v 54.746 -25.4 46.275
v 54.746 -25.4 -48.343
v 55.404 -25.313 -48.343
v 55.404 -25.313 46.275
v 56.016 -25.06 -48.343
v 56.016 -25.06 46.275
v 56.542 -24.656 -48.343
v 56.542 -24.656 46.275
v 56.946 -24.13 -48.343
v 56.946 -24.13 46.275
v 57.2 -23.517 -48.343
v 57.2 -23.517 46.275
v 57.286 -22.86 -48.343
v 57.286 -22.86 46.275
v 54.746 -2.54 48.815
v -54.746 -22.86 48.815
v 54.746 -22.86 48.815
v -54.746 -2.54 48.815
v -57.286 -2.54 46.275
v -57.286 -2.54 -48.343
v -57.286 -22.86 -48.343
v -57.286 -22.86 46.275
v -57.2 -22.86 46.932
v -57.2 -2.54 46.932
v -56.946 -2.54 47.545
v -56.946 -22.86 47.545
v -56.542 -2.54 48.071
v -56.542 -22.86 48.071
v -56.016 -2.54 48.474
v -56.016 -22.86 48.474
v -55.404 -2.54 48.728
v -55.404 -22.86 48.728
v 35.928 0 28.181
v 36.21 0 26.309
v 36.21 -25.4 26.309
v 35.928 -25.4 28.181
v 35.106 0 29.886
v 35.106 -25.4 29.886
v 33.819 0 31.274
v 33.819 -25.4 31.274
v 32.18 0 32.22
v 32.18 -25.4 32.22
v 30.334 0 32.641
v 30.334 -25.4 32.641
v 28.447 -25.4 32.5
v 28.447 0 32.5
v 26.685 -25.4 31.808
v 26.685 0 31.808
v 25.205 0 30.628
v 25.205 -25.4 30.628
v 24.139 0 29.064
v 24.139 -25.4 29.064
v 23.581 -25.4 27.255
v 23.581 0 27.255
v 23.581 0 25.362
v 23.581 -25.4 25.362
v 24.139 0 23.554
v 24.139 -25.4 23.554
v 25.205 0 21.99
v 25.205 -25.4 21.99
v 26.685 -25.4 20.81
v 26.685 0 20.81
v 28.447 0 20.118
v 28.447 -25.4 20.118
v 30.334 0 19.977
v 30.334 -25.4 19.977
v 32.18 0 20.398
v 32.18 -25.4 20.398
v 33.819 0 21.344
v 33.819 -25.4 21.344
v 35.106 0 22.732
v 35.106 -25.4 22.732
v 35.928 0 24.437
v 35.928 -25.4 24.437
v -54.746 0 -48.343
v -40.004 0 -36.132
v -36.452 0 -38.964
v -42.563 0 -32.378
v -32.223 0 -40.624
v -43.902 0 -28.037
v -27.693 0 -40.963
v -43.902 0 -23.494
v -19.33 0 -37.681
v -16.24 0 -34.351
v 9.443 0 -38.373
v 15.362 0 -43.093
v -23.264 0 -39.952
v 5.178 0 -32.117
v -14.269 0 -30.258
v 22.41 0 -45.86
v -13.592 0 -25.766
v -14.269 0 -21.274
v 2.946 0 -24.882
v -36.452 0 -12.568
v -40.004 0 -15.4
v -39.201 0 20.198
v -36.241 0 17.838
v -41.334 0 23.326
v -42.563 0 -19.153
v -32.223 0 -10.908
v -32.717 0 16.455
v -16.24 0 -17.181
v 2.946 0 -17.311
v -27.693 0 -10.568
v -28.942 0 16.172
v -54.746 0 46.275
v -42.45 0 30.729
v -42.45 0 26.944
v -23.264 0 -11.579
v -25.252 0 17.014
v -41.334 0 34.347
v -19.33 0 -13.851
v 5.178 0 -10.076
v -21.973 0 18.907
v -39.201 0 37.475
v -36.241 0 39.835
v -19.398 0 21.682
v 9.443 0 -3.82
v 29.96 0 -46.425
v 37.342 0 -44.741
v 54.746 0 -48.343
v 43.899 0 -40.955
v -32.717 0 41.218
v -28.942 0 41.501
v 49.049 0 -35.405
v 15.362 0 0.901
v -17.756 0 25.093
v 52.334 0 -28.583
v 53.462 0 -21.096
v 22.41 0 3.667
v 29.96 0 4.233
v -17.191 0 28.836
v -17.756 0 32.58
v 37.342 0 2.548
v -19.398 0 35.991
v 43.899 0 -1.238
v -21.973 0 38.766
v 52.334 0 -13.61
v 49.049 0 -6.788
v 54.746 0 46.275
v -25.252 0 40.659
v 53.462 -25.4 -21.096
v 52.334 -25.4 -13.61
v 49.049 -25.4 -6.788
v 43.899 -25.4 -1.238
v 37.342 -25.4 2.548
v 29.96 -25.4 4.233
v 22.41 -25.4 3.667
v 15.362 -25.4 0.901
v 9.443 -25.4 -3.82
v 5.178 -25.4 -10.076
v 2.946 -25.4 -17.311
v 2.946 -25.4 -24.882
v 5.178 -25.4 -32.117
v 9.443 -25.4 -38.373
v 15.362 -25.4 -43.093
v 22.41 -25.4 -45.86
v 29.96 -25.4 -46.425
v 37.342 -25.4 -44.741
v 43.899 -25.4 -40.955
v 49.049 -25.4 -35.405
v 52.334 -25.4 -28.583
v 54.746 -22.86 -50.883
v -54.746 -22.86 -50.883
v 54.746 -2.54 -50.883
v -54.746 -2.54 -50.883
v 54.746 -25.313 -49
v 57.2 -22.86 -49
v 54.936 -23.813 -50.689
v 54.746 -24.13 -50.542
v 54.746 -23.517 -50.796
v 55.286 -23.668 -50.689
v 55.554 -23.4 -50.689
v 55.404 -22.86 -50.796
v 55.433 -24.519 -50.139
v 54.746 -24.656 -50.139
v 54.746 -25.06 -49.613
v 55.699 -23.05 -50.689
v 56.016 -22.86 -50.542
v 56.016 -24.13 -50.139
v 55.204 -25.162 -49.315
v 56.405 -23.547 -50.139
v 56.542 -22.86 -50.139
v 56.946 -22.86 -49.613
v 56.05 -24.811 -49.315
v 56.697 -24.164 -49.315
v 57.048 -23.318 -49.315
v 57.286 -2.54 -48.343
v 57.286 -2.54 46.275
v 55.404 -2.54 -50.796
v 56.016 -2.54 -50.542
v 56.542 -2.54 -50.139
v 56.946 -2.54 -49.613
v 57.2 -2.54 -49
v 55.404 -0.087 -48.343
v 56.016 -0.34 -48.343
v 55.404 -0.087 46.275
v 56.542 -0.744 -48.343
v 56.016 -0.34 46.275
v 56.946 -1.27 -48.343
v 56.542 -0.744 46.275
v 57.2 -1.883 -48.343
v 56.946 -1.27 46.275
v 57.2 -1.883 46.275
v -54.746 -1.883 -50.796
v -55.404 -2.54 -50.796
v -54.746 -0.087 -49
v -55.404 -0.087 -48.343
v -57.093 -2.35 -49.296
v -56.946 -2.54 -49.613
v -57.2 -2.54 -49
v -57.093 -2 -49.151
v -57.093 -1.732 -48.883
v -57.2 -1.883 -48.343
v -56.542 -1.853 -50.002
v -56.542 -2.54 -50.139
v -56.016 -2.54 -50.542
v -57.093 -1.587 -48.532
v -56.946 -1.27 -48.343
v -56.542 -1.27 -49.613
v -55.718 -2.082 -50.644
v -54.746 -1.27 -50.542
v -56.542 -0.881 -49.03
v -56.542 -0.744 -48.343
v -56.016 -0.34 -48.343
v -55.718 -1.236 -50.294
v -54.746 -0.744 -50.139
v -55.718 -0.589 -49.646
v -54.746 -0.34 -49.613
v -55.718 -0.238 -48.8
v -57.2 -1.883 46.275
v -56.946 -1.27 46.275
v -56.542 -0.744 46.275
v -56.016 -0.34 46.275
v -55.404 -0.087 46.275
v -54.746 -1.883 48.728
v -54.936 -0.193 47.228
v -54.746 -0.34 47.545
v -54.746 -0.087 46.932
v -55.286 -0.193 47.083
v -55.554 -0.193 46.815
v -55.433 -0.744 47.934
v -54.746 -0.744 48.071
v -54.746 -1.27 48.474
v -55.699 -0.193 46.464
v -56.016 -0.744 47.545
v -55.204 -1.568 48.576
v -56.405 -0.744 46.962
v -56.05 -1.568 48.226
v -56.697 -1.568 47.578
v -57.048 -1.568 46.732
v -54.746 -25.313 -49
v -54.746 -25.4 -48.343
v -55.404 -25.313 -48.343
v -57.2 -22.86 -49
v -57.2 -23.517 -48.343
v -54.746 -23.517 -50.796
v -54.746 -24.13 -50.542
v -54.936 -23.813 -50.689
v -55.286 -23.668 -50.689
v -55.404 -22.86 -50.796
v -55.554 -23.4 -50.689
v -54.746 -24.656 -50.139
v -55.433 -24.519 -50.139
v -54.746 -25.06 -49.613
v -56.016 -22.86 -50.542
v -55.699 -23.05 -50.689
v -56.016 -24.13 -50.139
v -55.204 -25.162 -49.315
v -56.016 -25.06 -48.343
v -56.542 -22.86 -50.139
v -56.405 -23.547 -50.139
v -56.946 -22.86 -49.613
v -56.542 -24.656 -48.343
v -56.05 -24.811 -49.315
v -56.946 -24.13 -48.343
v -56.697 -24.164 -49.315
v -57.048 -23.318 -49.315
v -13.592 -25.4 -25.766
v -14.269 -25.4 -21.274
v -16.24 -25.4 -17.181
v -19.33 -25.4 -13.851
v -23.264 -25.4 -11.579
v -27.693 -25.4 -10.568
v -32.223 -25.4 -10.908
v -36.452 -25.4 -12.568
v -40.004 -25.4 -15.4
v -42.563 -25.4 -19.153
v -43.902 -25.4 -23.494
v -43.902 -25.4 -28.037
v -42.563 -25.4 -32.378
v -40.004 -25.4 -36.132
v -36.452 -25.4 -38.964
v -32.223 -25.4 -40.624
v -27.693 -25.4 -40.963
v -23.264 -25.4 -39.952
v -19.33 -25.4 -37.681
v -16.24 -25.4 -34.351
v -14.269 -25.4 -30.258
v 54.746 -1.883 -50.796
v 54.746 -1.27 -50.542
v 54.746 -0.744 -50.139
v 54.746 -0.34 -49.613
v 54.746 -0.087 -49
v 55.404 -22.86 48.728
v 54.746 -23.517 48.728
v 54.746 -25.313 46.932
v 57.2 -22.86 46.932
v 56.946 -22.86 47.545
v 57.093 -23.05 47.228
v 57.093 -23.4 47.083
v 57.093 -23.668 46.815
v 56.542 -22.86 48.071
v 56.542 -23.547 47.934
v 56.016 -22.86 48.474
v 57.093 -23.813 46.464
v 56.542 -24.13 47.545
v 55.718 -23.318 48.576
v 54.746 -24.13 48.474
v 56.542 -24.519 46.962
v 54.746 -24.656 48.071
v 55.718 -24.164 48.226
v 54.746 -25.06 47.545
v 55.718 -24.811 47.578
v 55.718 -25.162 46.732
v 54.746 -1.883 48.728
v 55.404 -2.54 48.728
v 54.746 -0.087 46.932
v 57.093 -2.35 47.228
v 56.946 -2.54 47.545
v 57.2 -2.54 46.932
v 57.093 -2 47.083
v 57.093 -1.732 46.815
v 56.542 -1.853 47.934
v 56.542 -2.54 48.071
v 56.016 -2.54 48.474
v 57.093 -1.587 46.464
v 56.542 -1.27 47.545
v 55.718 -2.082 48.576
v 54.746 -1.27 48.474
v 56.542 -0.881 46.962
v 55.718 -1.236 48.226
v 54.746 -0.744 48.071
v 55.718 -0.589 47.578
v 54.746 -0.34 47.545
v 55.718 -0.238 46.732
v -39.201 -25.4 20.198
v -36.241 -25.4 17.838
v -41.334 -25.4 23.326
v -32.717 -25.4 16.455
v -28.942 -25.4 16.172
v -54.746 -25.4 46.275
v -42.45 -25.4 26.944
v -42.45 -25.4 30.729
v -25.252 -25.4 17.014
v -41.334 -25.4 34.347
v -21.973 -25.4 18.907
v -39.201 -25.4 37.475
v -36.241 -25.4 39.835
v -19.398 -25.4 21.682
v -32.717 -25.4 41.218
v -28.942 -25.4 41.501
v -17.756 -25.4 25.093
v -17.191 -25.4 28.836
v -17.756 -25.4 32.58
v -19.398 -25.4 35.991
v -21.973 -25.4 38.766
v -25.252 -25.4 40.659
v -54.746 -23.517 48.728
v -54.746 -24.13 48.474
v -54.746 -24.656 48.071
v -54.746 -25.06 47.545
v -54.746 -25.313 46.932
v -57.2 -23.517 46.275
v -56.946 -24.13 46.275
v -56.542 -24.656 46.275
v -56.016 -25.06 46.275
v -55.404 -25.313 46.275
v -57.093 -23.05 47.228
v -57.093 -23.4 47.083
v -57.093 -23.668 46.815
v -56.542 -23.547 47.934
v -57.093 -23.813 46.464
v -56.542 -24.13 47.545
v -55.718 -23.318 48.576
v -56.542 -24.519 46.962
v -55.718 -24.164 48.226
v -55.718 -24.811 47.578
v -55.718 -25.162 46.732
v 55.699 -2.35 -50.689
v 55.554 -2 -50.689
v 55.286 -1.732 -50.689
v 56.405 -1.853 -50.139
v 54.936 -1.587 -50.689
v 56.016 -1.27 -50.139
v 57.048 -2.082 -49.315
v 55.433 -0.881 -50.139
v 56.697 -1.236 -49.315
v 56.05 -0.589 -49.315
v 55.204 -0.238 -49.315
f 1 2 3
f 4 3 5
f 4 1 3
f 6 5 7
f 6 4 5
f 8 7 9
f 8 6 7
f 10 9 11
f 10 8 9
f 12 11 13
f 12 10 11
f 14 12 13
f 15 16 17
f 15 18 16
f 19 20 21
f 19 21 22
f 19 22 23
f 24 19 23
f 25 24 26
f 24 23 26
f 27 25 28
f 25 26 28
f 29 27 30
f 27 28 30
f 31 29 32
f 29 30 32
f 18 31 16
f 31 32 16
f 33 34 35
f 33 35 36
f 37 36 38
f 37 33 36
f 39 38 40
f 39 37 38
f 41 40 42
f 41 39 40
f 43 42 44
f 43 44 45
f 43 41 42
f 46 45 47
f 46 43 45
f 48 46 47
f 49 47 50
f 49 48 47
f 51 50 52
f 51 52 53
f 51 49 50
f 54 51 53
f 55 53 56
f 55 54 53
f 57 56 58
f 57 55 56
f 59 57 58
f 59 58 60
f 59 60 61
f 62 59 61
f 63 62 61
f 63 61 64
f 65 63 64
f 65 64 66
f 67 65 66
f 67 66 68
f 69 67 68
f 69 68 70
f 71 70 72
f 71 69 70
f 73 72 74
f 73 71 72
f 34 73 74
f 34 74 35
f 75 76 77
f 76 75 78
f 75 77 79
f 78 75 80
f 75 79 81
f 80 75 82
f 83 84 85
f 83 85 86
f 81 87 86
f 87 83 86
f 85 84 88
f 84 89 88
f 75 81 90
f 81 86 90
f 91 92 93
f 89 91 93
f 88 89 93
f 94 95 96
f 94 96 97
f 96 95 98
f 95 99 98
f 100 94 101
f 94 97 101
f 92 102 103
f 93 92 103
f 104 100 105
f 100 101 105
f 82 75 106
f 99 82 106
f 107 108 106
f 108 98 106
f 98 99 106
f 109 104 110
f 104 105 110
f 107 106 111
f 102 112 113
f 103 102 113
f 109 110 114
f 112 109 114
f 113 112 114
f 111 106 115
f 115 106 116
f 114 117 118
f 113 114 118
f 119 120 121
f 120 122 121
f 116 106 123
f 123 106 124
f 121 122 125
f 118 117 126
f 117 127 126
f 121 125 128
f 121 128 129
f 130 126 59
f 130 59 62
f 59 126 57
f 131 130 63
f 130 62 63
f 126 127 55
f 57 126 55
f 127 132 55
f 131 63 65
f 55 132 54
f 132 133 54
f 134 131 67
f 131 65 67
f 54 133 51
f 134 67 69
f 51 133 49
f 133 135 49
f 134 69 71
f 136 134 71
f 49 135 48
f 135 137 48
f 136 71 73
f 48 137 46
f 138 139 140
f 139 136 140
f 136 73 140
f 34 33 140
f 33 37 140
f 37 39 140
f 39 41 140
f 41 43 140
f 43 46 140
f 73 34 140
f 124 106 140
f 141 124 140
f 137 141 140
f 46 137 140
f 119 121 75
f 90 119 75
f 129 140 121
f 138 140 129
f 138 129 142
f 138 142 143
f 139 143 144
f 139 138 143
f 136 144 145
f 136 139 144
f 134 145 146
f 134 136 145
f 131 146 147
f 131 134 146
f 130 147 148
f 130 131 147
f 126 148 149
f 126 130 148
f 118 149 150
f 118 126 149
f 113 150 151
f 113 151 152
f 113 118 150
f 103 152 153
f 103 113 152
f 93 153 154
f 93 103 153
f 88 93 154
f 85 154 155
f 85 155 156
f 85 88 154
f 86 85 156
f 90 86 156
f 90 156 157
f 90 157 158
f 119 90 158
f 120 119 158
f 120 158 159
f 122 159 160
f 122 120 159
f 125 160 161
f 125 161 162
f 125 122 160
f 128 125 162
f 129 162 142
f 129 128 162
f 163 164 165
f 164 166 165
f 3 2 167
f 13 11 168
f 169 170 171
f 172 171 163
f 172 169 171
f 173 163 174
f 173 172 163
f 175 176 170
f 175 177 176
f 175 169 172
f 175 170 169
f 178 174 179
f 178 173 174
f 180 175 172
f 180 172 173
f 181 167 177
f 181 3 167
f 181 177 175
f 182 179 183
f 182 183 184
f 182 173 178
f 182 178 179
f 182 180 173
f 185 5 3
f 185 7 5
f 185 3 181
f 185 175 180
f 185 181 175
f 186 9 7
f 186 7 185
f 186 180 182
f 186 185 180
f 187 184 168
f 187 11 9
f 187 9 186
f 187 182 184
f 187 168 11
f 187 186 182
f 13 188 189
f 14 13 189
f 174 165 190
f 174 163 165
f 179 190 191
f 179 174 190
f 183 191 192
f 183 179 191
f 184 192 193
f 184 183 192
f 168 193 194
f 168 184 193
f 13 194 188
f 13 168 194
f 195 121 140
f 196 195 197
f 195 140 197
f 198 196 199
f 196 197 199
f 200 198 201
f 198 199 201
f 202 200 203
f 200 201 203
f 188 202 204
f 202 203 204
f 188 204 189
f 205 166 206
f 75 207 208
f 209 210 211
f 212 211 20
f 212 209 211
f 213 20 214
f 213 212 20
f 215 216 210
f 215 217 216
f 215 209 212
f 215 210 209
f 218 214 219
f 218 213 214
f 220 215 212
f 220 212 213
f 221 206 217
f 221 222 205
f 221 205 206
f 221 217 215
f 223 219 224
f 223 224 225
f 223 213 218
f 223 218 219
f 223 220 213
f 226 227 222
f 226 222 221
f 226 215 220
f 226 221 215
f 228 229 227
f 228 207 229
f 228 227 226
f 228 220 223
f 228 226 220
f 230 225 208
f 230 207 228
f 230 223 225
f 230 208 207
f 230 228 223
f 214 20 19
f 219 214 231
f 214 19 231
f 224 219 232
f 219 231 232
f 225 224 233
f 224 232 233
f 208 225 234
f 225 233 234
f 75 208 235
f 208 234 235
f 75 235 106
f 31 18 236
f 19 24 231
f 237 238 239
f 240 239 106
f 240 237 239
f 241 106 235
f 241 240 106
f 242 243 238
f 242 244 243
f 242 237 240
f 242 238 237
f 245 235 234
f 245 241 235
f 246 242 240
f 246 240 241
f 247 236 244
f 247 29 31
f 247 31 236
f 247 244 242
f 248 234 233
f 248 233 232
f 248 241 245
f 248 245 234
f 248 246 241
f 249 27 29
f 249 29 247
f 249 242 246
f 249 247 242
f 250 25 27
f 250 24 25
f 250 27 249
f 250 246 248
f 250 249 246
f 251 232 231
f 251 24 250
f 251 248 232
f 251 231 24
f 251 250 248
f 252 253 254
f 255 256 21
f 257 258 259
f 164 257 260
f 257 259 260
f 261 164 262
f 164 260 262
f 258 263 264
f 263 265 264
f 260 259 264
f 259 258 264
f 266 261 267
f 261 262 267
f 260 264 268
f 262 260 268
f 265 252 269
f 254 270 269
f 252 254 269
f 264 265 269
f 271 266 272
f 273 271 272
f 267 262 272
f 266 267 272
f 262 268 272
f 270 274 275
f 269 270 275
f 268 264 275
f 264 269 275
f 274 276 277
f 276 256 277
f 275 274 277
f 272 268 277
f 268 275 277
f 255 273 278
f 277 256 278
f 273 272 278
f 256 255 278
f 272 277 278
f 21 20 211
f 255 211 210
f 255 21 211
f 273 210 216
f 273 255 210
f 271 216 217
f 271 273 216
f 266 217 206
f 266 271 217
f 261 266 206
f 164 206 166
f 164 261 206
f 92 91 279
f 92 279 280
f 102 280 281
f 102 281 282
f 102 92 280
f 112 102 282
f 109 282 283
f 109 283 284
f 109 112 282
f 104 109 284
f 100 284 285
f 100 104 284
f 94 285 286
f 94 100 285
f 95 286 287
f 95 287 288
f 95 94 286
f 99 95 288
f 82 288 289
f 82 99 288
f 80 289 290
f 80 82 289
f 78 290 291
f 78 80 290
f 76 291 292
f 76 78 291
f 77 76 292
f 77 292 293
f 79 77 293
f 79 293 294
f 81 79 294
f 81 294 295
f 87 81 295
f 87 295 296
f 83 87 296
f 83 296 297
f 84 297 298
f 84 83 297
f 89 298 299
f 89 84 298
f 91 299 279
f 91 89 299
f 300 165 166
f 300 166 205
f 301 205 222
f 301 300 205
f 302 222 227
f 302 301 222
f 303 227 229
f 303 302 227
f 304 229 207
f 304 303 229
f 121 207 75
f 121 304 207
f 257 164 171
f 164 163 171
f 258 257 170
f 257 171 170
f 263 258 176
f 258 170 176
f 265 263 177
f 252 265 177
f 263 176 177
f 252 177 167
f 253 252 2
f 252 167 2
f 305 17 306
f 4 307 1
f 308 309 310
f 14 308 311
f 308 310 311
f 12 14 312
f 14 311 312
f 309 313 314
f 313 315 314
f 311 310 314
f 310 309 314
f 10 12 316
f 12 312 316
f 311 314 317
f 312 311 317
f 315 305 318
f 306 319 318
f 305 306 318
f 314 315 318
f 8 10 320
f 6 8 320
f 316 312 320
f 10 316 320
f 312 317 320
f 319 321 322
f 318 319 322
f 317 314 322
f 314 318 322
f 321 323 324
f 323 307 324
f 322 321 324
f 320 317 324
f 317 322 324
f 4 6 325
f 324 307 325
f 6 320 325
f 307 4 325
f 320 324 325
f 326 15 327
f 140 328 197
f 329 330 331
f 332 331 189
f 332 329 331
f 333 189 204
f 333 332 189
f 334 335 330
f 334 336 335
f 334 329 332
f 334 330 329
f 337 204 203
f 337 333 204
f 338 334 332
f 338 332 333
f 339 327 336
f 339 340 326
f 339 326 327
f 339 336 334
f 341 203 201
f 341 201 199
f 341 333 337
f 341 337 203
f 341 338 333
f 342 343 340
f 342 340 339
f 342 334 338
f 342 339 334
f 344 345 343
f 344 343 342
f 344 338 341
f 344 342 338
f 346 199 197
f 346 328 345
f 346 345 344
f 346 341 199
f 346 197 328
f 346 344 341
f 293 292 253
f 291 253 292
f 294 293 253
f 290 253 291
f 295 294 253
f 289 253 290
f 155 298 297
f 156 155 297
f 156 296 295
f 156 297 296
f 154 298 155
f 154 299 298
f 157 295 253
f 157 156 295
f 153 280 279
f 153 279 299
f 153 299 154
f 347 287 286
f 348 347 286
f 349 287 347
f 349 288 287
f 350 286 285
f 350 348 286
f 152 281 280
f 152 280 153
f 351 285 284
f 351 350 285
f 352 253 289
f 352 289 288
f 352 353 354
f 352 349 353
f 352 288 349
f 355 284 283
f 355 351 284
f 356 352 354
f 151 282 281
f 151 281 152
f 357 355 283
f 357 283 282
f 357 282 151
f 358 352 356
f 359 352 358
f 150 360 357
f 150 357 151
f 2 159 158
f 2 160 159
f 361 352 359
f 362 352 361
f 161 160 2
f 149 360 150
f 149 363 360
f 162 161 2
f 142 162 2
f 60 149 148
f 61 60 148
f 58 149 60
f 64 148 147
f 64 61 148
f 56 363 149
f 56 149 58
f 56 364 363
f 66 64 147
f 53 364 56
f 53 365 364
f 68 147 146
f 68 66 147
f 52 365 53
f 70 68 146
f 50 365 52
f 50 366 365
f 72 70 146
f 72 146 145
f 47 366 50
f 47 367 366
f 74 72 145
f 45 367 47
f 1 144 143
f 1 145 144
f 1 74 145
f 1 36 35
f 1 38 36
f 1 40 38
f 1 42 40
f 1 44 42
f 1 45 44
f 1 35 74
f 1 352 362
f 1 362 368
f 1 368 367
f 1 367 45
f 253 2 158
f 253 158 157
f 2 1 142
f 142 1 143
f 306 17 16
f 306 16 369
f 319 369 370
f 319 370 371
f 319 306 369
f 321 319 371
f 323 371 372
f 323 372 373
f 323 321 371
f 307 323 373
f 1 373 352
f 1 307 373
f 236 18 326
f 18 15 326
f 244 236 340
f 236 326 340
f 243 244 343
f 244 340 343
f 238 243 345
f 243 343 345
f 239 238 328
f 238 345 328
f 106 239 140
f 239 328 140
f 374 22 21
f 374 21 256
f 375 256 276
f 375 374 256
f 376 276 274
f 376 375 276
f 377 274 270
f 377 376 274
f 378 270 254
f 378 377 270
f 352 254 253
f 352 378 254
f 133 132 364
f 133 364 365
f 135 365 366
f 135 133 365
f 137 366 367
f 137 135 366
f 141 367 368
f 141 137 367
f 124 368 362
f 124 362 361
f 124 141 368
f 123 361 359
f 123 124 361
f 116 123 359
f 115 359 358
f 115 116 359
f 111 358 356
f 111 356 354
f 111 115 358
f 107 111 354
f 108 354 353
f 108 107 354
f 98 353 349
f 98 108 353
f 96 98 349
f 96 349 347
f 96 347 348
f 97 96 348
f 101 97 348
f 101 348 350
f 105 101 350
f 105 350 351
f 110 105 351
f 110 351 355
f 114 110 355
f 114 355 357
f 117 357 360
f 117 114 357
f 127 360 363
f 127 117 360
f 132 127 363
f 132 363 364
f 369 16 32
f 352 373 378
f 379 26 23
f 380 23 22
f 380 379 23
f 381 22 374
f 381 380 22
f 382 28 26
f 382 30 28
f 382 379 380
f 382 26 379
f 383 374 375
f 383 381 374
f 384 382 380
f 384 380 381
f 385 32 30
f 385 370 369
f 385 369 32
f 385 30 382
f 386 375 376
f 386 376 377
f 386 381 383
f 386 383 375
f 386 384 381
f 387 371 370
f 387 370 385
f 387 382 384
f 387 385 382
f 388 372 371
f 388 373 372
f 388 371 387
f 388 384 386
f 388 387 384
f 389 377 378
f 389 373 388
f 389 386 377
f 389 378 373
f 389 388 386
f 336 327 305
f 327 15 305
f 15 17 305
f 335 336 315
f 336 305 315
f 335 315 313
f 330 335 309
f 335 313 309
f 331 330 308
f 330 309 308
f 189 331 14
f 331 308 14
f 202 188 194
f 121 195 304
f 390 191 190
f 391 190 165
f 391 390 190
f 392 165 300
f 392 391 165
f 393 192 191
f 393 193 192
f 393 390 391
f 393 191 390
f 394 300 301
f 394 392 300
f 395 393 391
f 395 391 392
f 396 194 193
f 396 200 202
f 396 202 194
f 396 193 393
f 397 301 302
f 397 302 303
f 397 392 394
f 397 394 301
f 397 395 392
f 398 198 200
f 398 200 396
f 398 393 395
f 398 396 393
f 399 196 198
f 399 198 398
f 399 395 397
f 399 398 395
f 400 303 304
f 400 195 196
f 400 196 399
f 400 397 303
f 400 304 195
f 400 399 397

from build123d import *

# Parameters (mm, degrees)
F0_W     = 114.572242
F0_H     = 99.697284
F1_DEPTH = 25.4
F2_R     = 12.7
F2_R_2   = 6.35
F2_R_3   = 15.24
F2_R_4   = 25.4
F3_DEPTH = 25.4
F4_R     = 2.54


with BuildPart() as f1:
    # F0 (on Front) → F1 (new body)
    with BuildSketch(Plane.XZ):
        with Locations((4e-06, -1.034044)):
            Rectangle(F0_W, F0_H)
    extrude(amount=F1_DEPTH)

    # F2 (on Front) → F3 (cut)
    with BuildSketch(Plane.XZ):
        with Locations((-29.891482, 28.83641)):
            Circle(F2_R)
        with Locations((29.859781, 26.308896)):
            Circle(F2_R_2)
        with Locations((-28.831949, -25.76586)):
            Circle(F2_R_3)
        with Locations((28.062282, -21.096375)):
            Circle(F2_R_4)
    extrude(amount=F3_DEPTH, mode=Mode.SUBTRACT)

    # F4
    f4_edges = [f1.edges().sort_by_distance(p)[0] for p in [
        (4e-06, -25.4, 48.814598),
        (-57.286117, -12.7, 48.814598),
        (4e-06, 0, 48.814598),
        (57.286125, -12.7, 48.814598),
        (57.286125, -25.4, -1.034044),
        (57.286125, 0, -1.034044),
        (-57.286117, -25.4, -1.034044),
        (4e-06, -25.4, -50.882686),
        (57.286125, -12.7, -50.882686),
        (4e-06, 0, -50.882686),
        (-57.286117, -12.7, -50.882686),
        (-57.286117, 0, -1.034044),
    ]]
    fillet(f4_edges, radius=F4_R)


solid = f1.part
